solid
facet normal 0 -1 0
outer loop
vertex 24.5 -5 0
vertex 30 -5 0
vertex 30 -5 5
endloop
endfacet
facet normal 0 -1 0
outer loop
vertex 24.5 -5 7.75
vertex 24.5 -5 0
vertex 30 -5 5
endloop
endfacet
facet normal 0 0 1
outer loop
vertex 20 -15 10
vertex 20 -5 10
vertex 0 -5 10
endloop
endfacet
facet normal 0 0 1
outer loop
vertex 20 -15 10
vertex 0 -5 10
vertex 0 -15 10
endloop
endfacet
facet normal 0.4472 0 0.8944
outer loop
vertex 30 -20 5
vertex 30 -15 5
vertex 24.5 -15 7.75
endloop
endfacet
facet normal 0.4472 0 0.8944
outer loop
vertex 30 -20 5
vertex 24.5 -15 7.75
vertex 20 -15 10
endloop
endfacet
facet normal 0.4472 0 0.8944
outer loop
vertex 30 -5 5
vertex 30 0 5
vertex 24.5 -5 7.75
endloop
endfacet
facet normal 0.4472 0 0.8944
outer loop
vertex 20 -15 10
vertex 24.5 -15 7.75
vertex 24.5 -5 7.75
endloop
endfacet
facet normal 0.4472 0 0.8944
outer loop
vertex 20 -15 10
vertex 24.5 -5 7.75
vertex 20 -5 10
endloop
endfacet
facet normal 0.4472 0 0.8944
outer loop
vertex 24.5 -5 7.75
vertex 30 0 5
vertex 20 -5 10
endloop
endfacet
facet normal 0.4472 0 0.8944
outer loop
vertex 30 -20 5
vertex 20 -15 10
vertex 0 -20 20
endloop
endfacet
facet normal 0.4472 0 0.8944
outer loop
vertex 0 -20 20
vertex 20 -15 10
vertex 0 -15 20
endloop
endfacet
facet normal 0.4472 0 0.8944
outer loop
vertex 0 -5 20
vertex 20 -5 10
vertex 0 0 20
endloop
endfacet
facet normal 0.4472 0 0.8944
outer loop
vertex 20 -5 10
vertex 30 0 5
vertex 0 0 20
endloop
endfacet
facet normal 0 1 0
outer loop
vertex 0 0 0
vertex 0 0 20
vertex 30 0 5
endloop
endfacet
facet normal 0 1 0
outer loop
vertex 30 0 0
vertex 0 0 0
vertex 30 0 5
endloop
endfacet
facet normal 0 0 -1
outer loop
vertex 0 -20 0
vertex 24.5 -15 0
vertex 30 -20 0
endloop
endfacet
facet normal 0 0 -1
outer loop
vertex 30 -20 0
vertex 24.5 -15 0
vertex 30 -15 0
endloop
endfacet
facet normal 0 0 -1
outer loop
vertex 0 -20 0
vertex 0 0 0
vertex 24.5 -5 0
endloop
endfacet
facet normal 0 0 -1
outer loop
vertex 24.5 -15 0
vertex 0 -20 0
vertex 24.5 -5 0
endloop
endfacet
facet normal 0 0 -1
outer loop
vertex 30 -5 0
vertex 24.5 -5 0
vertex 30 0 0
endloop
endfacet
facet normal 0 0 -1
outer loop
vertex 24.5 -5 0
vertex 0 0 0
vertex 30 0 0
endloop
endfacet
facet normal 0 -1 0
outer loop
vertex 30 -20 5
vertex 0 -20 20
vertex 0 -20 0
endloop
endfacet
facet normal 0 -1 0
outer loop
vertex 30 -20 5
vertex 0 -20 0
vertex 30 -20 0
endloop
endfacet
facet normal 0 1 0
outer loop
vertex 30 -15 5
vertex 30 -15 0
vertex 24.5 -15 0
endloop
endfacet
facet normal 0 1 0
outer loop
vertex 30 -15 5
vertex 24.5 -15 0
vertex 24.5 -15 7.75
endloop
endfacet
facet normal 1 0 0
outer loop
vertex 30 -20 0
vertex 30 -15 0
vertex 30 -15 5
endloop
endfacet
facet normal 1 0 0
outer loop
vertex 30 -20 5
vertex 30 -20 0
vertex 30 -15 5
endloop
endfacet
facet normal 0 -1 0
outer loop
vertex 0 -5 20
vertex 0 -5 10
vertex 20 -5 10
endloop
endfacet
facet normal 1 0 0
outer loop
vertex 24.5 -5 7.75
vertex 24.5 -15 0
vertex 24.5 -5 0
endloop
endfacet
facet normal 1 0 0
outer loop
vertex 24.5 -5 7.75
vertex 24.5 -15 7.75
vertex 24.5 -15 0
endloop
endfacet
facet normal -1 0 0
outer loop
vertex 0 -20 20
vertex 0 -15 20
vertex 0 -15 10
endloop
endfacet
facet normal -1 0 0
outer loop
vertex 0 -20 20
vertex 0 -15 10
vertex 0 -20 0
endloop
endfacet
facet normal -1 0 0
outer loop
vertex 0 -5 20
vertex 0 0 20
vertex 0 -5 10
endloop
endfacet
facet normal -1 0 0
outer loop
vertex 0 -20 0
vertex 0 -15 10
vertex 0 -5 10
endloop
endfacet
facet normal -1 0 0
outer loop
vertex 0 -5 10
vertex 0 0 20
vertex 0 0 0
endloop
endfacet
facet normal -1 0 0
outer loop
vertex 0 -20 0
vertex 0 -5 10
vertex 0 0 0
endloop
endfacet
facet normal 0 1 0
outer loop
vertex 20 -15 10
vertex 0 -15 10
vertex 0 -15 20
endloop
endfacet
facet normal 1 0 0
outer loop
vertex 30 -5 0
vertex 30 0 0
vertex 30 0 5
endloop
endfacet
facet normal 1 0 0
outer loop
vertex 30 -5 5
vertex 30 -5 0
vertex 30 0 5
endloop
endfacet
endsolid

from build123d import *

# Parameters (mm, degrees)
F1_DEPTH = 20
F2_W     = 10
F2_H     = 5
F3_DEPTH = 5.5
F4_W     = 10
F4_H     = 10
F5_DEPTH = 30.001
F6_W     = 5.5
F6_H     = 10
F7_DEPTH = 15.001


with BuildPart() as f1:
    # F0 (on Front) → F1 (new body)
    with BuildSketch(Plane.XZ):
        Polygon((0, 20), (0, 0), (30, 0), (30, 5), align=None)
    extrude(amount=F1_DEPTH)

    # F2 (on face) → F3 (cut)
    with BuildSketch(Plane.YZ.offset(30)):
        with Locations((-10, 2.5)):
            Rectangle(F2_W, F2_H)
    extrude(amount=-F3_DEPTH, mode=Mode.SUBTRACT)

    # F4 (on face) → F5 (cut, through all)
    with BuildSketch(Plane(origin=(0, 0, 0), x_dir=(0, -1, 0), z_dir=(-1, 0, 0))):
        with Locations((10, 15)):
            Rectangle(F4_W, F4_H)
    extrude(amount=-F5_DEPTH, mode=Mode.SUBTRACT)

    # F6 (on face) → F7 (cut, through all)
    with BuildSketch(Plane(origin=(0, 0, 5), x_dir=(1, 0, 0), z_dir=(0, 0, -1))):
        with Locations((27.25, 10)):
            Rectangle(F6_W, F6_H)
    extrude(amount=-F7_DEPTH, mode=Mode.SUBTRACT)


solid = f1.part
